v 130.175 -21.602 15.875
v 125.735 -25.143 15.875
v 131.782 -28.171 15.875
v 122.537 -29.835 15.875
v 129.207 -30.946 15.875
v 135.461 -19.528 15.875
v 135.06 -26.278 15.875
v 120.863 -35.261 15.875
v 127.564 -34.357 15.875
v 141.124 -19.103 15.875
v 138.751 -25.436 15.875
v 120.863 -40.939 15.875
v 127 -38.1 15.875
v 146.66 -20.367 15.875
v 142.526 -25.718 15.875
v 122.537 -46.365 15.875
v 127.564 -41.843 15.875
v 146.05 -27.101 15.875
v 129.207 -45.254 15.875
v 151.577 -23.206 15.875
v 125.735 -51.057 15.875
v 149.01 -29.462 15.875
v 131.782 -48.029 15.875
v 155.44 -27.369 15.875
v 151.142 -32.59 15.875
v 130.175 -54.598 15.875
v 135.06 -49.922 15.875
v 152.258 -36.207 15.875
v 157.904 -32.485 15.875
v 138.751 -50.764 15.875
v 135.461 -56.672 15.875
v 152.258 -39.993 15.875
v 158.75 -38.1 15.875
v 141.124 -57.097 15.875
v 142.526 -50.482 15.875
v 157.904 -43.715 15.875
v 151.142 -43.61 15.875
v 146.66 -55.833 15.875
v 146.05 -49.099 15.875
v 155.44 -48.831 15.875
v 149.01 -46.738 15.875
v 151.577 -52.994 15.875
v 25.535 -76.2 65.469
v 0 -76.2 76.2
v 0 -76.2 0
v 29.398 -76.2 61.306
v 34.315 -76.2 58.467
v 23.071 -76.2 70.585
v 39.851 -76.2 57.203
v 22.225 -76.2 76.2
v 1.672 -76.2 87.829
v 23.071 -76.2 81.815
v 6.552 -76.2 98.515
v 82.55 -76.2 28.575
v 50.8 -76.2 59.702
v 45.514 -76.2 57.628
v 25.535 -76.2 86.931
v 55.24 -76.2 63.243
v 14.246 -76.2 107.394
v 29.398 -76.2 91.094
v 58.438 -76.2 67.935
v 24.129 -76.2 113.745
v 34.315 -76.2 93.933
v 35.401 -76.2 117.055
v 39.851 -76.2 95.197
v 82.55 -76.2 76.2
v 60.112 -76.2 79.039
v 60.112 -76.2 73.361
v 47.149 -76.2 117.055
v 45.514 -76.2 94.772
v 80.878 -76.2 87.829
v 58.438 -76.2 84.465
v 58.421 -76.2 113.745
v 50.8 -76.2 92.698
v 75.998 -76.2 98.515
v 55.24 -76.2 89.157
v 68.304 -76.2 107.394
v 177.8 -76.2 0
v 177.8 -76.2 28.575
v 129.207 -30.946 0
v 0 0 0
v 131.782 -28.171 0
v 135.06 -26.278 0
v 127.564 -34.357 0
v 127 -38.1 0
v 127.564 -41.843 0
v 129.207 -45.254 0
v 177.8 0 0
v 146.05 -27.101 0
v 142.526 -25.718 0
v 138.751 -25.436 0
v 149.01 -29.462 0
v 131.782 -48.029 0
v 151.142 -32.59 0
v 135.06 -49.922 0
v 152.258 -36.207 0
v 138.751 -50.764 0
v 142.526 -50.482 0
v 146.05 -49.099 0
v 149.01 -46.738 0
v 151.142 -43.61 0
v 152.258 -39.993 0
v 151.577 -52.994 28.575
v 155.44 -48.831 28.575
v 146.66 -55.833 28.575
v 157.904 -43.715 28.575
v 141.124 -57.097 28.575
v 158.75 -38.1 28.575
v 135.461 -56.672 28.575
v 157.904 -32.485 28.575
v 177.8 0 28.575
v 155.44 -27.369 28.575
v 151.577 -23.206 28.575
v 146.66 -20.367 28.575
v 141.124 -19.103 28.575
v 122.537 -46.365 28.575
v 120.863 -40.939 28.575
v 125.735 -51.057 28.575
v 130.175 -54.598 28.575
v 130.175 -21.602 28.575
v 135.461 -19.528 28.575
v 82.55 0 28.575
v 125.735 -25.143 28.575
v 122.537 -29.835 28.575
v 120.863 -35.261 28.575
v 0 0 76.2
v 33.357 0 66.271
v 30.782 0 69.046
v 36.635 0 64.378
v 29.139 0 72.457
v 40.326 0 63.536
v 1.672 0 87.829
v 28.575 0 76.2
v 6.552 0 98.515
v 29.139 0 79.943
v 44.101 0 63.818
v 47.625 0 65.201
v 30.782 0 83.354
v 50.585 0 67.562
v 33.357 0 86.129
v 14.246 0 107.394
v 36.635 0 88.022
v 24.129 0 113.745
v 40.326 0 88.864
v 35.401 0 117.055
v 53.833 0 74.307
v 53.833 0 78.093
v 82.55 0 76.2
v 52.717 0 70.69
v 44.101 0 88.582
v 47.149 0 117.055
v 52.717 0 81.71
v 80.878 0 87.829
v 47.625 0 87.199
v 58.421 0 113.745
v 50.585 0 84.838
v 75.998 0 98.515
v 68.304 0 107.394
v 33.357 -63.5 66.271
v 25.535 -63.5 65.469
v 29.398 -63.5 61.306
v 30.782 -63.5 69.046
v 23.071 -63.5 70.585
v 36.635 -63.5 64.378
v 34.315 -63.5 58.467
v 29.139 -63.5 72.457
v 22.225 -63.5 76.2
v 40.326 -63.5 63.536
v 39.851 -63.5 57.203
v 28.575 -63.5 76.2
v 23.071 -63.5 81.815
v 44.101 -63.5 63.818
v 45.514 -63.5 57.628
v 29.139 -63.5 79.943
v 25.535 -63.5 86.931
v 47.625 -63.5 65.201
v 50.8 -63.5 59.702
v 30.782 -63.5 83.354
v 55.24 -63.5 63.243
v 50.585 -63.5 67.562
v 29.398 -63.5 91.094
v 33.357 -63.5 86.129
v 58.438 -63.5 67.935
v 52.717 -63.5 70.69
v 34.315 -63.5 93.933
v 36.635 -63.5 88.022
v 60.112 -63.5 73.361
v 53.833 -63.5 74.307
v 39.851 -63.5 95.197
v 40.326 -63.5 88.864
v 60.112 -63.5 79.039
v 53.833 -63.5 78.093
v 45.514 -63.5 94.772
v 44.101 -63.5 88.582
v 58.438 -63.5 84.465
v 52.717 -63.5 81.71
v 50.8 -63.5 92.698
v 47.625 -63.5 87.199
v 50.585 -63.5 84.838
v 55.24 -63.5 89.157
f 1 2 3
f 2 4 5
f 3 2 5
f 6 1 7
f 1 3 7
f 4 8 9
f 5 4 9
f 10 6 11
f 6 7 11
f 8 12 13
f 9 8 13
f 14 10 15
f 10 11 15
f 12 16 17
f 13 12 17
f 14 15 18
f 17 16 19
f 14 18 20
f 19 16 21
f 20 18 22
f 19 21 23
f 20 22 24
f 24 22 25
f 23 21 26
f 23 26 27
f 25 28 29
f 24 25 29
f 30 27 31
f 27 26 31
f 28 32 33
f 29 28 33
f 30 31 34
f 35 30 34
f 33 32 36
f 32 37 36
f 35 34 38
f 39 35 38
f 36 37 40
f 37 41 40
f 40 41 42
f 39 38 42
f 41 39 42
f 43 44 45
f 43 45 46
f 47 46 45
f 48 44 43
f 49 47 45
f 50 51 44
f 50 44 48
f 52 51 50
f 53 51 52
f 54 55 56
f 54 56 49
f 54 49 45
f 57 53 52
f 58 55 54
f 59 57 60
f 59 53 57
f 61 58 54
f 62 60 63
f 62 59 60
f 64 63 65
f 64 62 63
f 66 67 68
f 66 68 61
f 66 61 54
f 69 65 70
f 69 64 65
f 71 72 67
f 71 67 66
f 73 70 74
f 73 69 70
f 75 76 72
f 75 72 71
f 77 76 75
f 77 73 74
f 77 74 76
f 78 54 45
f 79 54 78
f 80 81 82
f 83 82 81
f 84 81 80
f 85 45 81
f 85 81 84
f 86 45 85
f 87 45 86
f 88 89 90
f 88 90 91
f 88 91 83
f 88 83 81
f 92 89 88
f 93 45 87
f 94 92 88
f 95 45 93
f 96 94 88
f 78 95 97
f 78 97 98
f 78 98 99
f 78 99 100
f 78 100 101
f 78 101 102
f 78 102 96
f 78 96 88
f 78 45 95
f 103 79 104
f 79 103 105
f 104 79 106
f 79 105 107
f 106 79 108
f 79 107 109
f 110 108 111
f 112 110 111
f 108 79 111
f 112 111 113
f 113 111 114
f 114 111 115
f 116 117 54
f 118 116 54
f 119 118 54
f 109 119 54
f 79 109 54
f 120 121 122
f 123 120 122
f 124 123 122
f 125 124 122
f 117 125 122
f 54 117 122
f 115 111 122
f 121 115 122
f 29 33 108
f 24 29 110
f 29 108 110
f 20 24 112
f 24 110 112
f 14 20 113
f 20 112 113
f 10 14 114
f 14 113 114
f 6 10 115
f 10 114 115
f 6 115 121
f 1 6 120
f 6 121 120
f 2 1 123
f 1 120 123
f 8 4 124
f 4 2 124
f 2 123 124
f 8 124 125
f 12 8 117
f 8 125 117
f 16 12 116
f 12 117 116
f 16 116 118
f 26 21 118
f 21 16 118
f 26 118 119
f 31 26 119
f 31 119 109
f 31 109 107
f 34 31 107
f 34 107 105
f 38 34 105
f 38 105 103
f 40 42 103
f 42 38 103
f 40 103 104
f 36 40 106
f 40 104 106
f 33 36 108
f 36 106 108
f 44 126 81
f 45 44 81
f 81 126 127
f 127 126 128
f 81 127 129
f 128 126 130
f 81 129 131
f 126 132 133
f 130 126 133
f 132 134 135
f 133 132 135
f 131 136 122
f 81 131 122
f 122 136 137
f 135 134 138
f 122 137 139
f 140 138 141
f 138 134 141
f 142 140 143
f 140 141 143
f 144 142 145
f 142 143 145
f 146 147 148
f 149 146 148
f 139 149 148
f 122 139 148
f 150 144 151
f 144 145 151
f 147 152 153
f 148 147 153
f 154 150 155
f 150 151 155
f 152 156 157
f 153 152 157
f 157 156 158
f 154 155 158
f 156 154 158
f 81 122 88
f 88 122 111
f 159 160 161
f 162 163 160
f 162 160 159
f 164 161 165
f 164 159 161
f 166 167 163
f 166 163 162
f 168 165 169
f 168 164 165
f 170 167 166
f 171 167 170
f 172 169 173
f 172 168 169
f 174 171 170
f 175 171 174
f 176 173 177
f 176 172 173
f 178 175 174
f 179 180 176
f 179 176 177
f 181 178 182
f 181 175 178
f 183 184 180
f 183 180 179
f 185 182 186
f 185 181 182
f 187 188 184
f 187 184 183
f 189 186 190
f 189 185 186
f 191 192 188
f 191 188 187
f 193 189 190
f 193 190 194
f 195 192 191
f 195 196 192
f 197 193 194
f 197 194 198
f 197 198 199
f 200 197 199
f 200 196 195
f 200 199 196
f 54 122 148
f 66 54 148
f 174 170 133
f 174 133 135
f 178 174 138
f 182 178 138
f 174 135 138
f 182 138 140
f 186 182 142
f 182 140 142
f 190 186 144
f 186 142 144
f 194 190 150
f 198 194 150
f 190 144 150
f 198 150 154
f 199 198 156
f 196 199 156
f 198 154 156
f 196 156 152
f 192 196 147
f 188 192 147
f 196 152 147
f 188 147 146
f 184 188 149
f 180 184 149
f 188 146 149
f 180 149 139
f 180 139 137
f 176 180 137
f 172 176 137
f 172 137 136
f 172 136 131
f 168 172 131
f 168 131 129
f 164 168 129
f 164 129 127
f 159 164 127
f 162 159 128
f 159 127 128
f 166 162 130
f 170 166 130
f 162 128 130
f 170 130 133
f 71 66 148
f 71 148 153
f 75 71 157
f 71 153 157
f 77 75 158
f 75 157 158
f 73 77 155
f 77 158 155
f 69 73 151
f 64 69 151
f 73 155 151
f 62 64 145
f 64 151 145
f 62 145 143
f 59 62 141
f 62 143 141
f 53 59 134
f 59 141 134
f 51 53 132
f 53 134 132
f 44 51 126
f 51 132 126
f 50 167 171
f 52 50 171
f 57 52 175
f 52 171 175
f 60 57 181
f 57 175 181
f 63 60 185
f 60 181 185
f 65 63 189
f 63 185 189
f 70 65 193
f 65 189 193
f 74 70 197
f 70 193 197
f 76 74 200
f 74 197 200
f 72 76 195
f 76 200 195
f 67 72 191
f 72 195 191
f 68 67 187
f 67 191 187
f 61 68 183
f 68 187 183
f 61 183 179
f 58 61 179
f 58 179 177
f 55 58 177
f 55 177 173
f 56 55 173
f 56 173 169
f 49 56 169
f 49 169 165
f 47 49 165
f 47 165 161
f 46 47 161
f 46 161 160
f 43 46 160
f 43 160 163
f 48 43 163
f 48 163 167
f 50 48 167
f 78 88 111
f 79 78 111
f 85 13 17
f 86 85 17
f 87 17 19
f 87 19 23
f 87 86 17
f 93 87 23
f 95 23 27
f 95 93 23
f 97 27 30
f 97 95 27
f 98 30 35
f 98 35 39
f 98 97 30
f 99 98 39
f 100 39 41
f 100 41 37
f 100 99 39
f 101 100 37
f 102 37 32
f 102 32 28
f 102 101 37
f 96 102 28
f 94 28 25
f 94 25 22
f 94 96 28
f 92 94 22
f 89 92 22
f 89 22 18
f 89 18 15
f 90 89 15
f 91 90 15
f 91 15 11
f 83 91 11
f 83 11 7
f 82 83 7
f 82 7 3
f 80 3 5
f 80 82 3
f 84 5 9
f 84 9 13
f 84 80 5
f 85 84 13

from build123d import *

# Parameters (mm, degrees)
F1_DEPTH = 76.2
F2_DEPTH = 63.5
F3_R     = 19.05
F4_DEPTH = 127
F6_DEPTH = 15.875


with BuildPart() as f1:
    # F0 (on Front) → F1 (new body)
    with BuildSketch(Plane.XZ):
        with BuildLine():
            Line((0, 76.2), (0, 0))
            Line((0, 0), (177.8, 0))
            Line((177.8, 0), (177.8, 28.575))
            Line((177.8, 28.575), (82.55, 28.575))
            Line((82.55, 28.575), (82.55, 76.2))
            Line((82.55, 76.2), (60.325, 76.2))
            ThreePointArc((60.325, 76.2), (41.275, 57.15), (22.225, 76.2))
            Line((22.225, 76.2), (0, 76.2))
        make_face()
        with BuildLine():
            ThreePointArc((82.55, 76.2), (41.275, 117.475), (0, 76.2))
            Line((0, 76.2), (22.225, 76.2))
            ThreePointArc((22.225, 76.2), (41.275, 95.25), (60.325, 76.2))
            Line((60.325, 76.2), (82.55, 76.2))
        make_face()
    extrude(amount=F1_DEPTH)

    # F0 (on Front) → F2 (join)
    with BuildSketch(Plane.XZ):
        with BuildLine():
            Line((28.575, 76.2), (22.225, 76.2))
            ThreePointArc((22.225, 76.2), (41.275, 57.15), (60.325, 76.2))
            Line((60.325, 76.2), (53.975, 76.2))
            ThreePointArc((53.975, 76.2), (41.275, 63.5), (28.575, 76.2))
        make_face()
        with BuildLine():
            ThreePointArc((60.325, 76.2), (41.275, 95.25), (22.225, 76.2))
            Line((22.225, 76.2), (28.575, 76.2))
            ThreePointArc((28.575, 76.2), (41.275, 88.9), (53.975, 76.2))
            Line((53.975, 76.2), (60.325, 76.2))
        make_face()
    extrude(amount=F2_DEPTH)

    # F3 (on face) → F4 (cut)
    with BuildSketch(Plane.XY.offset(28.575)):
        with Locations((139.7, -38.1)):
            Circle(F3_R)
    extrude(amount=-F4_DEPTH, mode=Mode.SUBTRACT)

    # F5 (on face) → F6 (join)
    with BuildSketch(Plane(origin=(0, 0, 0), x_dir=(1, 0, 0), z_dir=(0, 0, -1))):
        with BuildLine():
            ThreePointArc((120.65, 38.1), (139.7, 19.05), (158.75, 38.1))
            Line((158.75, 38.1), (152.4, 38.1))
            ThreePointArc((152.4, 38.1), (139.7, 25.4), (127, 38.1))
            Line((127, 38.1), (120.65, 38.1))
        make_face()
        with BuildLine():
            Line((152.4, 38.1), (158.75, 38.1))
            ThreePointArc((158.75, 38.1), (139.7, 57.15), (120.65, 38.1))
            Line((120.65, 38.1), (127, 38.1))
            ThreePointArc((127, 38.1), (139.7, 50.8), (152.4, 38.1))
        make_face()
    extrude(amount=-F6_DEPTH)


solid = f1.part
